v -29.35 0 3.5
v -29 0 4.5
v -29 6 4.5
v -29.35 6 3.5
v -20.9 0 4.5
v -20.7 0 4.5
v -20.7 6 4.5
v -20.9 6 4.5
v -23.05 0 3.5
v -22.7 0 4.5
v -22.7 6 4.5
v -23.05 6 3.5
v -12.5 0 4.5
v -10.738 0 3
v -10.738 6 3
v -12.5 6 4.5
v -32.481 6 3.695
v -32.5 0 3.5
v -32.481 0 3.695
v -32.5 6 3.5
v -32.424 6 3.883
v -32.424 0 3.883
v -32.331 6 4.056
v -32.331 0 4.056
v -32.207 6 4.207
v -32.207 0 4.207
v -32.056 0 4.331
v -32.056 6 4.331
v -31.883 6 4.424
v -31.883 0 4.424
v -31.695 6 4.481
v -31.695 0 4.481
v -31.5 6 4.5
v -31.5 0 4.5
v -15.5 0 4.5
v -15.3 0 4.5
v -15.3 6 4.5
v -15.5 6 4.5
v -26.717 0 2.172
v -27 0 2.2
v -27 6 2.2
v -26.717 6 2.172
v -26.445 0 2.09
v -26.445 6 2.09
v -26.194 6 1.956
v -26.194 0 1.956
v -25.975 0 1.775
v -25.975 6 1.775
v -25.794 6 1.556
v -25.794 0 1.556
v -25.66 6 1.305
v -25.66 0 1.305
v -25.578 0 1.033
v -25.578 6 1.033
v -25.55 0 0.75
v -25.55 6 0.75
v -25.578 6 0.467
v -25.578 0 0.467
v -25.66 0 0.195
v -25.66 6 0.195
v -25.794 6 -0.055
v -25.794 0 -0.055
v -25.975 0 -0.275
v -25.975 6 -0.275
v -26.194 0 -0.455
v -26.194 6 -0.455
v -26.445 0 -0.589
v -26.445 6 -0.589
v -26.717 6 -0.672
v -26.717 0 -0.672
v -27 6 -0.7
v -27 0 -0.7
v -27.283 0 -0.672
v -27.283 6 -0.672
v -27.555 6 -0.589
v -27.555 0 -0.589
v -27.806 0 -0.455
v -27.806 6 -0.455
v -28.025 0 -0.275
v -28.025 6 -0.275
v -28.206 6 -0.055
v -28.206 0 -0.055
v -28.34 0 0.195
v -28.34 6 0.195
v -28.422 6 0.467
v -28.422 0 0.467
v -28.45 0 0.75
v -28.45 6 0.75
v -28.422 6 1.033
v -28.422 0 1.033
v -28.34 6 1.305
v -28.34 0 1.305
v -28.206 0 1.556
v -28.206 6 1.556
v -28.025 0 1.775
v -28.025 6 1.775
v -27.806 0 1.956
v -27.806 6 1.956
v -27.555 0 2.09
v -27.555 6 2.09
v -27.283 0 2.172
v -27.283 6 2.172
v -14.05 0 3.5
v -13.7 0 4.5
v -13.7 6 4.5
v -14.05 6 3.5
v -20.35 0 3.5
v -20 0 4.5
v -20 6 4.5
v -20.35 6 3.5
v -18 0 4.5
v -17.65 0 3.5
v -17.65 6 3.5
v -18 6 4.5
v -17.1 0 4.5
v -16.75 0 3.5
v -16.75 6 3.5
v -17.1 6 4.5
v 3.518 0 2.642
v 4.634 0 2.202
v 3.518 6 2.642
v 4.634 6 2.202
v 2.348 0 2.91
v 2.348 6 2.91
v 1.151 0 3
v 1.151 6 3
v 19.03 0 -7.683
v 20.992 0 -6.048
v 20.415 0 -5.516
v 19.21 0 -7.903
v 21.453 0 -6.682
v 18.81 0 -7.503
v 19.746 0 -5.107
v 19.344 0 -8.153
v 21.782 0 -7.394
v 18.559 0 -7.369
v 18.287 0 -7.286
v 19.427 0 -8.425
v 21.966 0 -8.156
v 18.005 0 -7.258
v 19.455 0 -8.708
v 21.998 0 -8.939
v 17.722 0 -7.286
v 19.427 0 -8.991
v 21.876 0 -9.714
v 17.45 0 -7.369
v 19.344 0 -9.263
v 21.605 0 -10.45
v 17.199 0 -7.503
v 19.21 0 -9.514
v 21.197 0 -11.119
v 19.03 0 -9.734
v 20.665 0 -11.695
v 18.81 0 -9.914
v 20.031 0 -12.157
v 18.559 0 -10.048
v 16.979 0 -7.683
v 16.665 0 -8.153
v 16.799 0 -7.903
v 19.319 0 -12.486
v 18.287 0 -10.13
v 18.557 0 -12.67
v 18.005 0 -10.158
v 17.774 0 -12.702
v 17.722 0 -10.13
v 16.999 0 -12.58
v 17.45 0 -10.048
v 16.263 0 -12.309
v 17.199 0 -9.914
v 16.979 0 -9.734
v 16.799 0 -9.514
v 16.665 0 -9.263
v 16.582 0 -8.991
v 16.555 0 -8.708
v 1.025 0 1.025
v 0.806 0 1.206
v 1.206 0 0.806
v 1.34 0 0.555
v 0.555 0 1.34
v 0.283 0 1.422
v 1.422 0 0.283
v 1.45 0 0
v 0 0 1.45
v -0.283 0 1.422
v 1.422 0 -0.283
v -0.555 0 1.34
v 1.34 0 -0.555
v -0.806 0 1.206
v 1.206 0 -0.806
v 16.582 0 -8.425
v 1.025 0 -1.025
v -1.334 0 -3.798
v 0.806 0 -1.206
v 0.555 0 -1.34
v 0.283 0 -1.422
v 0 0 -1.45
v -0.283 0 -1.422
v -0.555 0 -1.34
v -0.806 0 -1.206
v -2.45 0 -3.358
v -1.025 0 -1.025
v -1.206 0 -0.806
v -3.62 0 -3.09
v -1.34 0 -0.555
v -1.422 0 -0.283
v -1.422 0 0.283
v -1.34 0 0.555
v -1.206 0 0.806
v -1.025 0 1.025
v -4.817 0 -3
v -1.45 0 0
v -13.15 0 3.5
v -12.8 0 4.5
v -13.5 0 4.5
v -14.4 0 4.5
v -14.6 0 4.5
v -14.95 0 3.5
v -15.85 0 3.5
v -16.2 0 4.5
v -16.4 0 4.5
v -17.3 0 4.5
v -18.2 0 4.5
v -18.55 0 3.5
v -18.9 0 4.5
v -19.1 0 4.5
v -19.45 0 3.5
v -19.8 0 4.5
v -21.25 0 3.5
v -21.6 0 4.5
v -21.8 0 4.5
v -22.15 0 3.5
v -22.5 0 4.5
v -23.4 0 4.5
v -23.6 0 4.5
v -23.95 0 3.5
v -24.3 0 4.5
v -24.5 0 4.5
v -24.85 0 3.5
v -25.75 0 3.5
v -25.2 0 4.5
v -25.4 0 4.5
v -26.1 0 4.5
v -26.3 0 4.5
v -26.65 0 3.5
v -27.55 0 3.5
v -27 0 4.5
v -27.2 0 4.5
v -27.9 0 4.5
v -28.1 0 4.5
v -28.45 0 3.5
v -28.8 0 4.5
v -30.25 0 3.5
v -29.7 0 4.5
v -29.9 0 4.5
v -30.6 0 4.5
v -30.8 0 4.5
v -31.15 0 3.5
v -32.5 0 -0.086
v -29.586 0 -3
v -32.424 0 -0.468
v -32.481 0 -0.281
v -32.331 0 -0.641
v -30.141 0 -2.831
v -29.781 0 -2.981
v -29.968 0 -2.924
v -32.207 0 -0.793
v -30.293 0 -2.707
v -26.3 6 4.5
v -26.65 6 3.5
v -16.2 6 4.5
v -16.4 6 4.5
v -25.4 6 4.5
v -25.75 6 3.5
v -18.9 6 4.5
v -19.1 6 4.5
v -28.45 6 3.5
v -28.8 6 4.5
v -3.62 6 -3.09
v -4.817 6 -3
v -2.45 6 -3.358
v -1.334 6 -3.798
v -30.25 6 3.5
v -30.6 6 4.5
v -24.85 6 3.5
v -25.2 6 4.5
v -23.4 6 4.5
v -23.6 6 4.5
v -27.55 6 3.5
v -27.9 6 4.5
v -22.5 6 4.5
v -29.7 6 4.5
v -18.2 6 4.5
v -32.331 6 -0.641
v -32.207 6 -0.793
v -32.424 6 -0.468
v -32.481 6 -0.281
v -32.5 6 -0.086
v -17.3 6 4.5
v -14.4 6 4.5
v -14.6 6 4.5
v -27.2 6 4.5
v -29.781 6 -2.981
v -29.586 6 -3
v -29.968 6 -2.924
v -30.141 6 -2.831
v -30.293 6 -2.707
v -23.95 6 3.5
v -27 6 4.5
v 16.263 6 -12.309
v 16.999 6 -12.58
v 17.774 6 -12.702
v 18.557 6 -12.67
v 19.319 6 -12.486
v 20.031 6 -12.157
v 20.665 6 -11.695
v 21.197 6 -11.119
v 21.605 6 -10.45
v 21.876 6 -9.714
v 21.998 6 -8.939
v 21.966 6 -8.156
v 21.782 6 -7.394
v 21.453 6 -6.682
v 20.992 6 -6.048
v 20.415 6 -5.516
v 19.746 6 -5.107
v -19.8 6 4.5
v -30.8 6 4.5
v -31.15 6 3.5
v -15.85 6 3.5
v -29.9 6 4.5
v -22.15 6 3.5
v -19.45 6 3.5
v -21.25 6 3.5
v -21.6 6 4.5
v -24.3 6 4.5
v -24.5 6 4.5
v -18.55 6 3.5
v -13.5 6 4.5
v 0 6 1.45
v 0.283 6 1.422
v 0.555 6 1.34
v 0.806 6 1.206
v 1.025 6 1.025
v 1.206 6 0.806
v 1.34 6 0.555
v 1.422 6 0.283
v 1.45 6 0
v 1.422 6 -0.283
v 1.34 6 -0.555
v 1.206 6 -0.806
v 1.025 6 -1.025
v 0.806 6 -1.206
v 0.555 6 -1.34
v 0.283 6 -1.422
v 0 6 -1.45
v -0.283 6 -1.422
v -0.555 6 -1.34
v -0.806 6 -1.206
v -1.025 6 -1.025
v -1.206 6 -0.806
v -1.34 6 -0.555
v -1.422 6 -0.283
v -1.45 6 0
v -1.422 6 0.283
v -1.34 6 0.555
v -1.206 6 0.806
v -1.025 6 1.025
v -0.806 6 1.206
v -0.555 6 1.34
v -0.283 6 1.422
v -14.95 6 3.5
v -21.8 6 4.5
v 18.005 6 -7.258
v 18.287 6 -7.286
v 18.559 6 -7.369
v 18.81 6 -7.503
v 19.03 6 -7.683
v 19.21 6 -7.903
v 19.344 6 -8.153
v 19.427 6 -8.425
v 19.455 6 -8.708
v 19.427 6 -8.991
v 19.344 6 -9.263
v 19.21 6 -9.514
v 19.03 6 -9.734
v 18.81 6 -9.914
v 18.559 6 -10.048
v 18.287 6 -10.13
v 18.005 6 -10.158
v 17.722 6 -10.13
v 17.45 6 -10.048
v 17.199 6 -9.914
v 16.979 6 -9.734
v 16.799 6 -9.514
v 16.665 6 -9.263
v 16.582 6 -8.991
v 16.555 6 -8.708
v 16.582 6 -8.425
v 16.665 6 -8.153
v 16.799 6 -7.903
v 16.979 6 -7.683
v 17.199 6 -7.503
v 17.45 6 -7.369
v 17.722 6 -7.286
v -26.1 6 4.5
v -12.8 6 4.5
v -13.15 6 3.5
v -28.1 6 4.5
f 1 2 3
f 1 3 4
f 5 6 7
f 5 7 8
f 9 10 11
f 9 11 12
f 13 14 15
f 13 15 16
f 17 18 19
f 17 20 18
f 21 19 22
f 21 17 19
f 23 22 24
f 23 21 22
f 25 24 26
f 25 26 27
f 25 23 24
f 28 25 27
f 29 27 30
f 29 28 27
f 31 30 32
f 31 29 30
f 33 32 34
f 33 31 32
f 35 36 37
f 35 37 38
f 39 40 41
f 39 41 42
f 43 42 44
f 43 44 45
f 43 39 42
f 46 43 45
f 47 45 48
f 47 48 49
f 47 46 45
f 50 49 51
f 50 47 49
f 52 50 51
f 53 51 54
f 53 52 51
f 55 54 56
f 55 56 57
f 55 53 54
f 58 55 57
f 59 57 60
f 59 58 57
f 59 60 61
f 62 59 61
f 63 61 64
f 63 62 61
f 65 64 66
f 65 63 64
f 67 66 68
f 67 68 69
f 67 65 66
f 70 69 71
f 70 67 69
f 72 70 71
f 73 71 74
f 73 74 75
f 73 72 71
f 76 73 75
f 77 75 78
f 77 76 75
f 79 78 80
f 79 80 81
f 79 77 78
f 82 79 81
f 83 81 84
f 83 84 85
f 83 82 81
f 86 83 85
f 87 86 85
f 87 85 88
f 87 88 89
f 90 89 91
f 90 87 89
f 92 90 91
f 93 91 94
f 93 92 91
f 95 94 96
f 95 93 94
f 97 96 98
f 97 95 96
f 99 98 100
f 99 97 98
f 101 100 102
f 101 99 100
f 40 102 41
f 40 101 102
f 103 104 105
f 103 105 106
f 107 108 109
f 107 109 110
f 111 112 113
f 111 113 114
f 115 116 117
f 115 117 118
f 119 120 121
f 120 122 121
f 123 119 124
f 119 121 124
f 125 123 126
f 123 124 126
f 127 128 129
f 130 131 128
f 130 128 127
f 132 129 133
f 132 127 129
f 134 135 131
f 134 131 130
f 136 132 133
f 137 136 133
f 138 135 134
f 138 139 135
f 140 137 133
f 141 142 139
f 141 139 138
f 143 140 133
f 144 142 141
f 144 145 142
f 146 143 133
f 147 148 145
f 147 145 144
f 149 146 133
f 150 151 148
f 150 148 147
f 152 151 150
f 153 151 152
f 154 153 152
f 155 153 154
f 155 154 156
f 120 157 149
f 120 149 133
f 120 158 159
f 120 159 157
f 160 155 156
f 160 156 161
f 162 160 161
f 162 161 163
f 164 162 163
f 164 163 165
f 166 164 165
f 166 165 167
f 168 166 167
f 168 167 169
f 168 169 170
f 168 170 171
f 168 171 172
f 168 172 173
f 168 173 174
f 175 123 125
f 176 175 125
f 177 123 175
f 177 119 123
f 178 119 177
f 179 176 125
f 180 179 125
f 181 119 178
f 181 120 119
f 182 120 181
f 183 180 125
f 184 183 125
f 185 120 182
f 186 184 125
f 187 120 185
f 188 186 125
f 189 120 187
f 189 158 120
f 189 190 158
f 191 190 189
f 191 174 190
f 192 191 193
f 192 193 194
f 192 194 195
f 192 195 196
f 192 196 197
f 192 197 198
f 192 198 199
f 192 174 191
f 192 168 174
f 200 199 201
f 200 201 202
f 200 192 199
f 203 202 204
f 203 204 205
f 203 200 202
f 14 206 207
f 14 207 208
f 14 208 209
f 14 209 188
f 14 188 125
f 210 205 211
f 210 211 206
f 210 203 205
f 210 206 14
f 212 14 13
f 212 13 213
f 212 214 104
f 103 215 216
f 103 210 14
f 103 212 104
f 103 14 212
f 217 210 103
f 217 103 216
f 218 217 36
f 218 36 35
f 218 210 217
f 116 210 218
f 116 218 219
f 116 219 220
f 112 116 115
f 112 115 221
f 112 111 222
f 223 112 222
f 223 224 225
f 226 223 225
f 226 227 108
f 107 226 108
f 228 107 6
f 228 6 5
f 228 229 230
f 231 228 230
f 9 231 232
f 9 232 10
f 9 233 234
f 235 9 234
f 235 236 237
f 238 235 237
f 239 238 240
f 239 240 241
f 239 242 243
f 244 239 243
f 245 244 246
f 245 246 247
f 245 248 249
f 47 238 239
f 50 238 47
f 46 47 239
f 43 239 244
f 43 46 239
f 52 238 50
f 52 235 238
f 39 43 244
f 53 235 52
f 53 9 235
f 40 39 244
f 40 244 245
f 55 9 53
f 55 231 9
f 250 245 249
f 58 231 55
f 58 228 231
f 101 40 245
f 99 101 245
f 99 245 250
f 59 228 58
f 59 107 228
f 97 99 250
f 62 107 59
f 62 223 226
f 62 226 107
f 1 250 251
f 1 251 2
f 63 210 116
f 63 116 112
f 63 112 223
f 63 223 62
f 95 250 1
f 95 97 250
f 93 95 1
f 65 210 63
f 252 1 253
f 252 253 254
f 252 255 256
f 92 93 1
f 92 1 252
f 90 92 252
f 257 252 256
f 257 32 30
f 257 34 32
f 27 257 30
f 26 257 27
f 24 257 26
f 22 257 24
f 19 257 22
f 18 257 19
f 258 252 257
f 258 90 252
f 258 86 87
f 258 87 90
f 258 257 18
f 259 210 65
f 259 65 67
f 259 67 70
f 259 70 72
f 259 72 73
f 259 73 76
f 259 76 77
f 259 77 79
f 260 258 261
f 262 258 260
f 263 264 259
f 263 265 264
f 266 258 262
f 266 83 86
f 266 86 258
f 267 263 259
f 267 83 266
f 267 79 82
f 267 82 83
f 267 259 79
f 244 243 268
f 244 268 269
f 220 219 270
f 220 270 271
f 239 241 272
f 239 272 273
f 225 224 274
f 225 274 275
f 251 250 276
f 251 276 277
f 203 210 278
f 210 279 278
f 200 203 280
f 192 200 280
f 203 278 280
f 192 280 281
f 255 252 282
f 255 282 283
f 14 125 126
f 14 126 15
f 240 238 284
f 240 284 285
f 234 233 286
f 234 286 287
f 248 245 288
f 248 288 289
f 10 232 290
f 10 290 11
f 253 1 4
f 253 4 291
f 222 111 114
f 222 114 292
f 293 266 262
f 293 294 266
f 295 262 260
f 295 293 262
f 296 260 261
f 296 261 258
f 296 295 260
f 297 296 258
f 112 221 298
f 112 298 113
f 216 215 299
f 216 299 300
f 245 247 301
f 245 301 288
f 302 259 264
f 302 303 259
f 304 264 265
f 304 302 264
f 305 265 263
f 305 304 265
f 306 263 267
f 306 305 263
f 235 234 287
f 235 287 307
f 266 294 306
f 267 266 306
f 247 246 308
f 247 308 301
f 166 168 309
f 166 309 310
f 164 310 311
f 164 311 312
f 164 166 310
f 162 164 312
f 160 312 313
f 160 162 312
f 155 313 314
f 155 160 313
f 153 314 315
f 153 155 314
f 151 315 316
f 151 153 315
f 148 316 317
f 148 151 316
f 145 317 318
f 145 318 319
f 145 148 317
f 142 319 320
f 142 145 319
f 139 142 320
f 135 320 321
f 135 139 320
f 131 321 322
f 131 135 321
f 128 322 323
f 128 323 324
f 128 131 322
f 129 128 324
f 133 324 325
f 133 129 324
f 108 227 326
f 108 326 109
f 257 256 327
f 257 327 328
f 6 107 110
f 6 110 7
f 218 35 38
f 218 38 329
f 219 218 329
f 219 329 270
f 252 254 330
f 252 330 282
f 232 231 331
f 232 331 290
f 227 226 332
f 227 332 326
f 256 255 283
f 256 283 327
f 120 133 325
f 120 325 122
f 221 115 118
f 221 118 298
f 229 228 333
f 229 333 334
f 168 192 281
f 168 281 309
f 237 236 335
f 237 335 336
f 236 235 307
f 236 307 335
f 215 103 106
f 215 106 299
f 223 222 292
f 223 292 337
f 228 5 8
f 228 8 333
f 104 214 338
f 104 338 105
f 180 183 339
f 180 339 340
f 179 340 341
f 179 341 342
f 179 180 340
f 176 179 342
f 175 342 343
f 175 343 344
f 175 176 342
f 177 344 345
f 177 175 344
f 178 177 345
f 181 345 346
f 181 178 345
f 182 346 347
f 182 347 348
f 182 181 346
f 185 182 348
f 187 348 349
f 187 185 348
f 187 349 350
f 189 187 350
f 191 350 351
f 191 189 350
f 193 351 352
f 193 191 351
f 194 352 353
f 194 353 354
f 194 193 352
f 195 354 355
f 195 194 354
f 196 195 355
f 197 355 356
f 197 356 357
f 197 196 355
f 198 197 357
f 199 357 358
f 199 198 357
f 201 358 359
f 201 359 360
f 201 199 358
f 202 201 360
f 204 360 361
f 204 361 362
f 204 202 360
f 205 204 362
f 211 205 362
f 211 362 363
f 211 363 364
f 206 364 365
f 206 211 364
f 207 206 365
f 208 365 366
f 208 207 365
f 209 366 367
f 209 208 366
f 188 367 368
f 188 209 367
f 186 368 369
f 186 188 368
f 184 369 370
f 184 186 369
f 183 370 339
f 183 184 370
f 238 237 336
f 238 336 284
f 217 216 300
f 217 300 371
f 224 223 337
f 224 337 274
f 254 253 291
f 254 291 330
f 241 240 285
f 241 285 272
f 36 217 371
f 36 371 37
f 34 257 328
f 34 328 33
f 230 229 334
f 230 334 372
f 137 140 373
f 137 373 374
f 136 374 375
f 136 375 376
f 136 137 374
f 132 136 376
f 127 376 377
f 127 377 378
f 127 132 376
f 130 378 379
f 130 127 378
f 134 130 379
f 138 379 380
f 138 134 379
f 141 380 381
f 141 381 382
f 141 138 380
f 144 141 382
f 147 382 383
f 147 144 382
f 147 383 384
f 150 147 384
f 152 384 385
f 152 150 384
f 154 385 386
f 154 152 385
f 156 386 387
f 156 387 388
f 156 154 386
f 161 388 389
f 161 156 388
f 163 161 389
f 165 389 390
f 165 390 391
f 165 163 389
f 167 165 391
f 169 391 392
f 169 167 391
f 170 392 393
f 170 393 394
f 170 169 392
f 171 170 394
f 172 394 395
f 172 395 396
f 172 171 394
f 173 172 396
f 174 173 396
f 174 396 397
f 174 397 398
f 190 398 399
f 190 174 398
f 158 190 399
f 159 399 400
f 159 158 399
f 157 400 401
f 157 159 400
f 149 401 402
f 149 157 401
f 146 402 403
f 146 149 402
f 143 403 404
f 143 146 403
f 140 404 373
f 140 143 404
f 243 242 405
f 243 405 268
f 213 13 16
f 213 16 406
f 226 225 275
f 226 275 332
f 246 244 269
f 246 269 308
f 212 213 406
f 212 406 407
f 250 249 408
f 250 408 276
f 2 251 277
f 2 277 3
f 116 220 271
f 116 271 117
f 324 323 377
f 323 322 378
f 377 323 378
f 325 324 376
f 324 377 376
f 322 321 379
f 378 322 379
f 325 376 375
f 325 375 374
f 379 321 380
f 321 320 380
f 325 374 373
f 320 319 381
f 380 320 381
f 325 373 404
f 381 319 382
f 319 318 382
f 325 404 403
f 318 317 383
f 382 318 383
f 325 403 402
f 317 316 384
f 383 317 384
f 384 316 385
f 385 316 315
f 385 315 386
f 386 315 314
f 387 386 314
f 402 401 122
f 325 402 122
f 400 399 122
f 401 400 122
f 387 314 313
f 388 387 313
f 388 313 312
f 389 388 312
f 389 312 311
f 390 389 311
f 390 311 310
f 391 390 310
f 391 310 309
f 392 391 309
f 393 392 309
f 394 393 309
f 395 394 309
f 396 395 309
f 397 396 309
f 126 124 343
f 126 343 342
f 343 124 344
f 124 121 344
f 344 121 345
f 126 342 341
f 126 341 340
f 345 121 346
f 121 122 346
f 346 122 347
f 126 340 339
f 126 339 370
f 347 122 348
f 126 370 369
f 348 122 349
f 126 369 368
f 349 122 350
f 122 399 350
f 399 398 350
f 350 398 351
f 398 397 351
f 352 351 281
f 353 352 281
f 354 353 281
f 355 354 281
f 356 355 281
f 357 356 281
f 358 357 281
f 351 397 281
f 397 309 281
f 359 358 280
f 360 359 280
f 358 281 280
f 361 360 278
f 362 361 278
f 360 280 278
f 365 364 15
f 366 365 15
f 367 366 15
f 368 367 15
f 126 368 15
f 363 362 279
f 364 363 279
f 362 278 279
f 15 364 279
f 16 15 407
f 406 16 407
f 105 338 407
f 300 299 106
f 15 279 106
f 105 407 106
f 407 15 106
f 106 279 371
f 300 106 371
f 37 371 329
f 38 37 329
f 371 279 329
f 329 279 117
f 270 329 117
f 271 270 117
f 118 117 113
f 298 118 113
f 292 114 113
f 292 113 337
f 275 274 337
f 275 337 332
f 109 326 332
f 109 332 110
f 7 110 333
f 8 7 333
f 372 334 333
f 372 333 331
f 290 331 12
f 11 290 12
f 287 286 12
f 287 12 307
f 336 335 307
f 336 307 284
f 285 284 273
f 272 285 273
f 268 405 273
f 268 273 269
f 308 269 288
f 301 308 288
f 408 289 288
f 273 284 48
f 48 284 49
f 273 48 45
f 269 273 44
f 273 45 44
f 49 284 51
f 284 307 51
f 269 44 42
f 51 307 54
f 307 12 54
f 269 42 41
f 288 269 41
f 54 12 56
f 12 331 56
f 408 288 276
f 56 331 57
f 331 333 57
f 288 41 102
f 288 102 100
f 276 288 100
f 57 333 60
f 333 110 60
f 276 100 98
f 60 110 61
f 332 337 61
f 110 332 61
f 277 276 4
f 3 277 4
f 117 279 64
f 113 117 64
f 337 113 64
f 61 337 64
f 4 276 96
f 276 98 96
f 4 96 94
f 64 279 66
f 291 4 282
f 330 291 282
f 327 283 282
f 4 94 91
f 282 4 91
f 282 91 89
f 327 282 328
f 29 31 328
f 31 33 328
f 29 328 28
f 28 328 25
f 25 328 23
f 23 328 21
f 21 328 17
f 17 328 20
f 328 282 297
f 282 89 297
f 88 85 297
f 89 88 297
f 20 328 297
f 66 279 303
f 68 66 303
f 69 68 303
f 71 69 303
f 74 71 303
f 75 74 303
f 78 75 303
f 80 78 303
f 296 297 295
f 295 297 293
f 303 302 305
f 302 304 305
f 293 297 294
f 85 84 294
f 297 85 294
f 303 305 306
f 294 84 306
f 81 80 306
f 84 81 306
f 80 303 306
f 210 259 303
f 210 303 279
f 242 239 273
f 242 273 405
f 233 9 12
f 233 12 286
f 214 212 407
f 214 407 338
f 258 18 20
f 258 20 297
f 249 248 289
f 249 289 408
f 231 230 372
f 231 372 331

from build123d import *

# Parameters (mm, degrees)
CROQUIS_BASE_R          = 1.45
SALIENTE_EXTRUIR1_DEPTH = 6
REDONDEO1_R             = 1
REDONDEO2_R             = 8


with BuildPart() as part:
    # Croquis base → Saliente-Extruir1 (new body)
    with BuildSketch(Plane(origin=(0, 0, 0), x_dir=(1, 0, 0), z_dir=(0, 1, 0))):
        with BuildLine():
            Line((2.984067851, -3), (-10.738, -3))
            Line((-10.738, -3), (-12.5, -4.5))
            Line((-12.5, -4.5), (-12.6, -4.5))
            Line((-12.6, -4.5), (-12.8, -4.5))
            Line((-12.8, -4.5), (-13.15, -3.5))
            Line((-13.15, -3.5), (-13.5, -4.5))
            Line((-13.5, -4.5), (-13.7, -4.5))
            Line((-13.7, -4.5), (-14.05, -3.5))
            Line((-14.05, -3.5), (-14.4, -4.5))
            Line((-14.4, -4.5), (-14.6, -4.5))
            Line((-14.6, -4.5), (-14.95, -3.5))
            Line((-14.95, -3.5), (-15.3, -4.5))
            Line((-15.3, -4.5), (-15.5, -4.5))
            Line((-15.5, -4.5), (-15.85, -3.5))
            Line((-15.85, -3.5), (-16.2, -4.5))
            Line((-16.2, -4.5), (-16.4, -4.5))
            Line((-16.4, -4.5), (-16.75, -3.5))
            Line((-16.75, -3.5), (-17.1, -4.5))
            Line((-17.1, -4.5), (-17.3, -4.5))
            Line((-17.3, -4.5), (-17.65, -3.5))
            Line((-17.65, -3.5), (-18, -4.5))
            Line((-18, -4.5), (-18.2, -4.5))
            Line((-18.2, -4.5), (-18.55, -3.5))
            Line((-18.55, -3.5), (-18.9, -4.5))
            Line((-18.9, -4.5), (-19.1, -4.5))
            Line((-19.1, -4.5), (-19.45, -3.5))
            Line((-19.45, -3.5), (-19.8, -4.5))
            Line((-19.8, -4.5), (-20, -4.5))
            Line((-20, -4.5), (-20.35, -3.5))
            Line((-20.35, -3.5), (-20.7, -4.5))
            Line((-20.7, -4.5), (-20.9, -4.5))
            Line((-20.9, -4.5), (-21.25, -3.5))
            Line((-21.25, -3.5), (-21.6, -4.5))
            Line((-21.6, -4.5), (-21.8, -4.5))
            Line((-21.8, -4.5), (-22.15, -3.5))
            Line((-22.15, -3.5), (-22.5, -4.5))
            Line((-22.5, -4.5), (-22.7, -4.5))
            Line((-22.7, -4.5), (-23.05, -3.5))
            Line((-23.05, -3.5), (-23.4, -4.5))
            Line((-23.4, -4.5), (-23.6, -4.5))
            Line((-23.6, -4.5), (-23.95, -3.5))
            Line((-23.95, -3.5), (-24.3, -4.5))
            Line((-24.3, -4.5), (-24.5, -4.5))
            Line((-24.5, -4.5), (-24.85, -3.5))
            Line((-24.85, -3.5), (-25.2, -4.5))
            Line((-25.2, -4.5), (-25.4, -4.5))
            Line((-25.4, -4.5), (-25.75, -3.5))
            Line((-25.75, -3.5), (-26.1, -4.5))
            Line((-26.1, -4.5), (-26.3, -4.5))
            Line((-26.3, -4.5), (-26.65, -3.5))
            Line((-26.65, -3.5), (-27, -4.5))
            Line((-27, -4.5), (-27.2, -4.5))
            Line((-27.2, -4.5), (-27.55, -3.5))
            Line((-27.55, -3.5), (-27.9, -4.5))
            Line((-27.9, -4.5), (-28.1, -4.5))
            Line((-28.1, -4.5), (-28.45, -3.5))
            Line((-28.45, -3.5), (-28.8, -4.5))
            Line((-28.8, -4.5), (-29, -4.5))
            Line((-29, -4.5), (-29.35, -3.5))
            Line((-29.35, -3.5), (-29.7, -4.5))
            Line((-29.7, -4.5), (-29.9, -4.5))
            Line((-29.9, -4.5), (-30.25, -3.5))
            Line((-30.25, -3.5), (-30.6, -4.5))
            Line((-30.6, -4.5), (-30.8, -4.5))
            Line((-30.8, -4.5), (-31.15, -3.5))
            Line((-31.15, -3.5), (-31.5, -4.5))
            Line((-31.5, -4.5), (-32.5, -4.5))
            Line((-32.5, -4.5), (-32.5, -3))
            Line((-32.5, -3), (-32.5, 0.5))
            Line((-32.5, 0.5), (-30, 3))
            Line((-30, 3), (-2.984067851, 3))
            Line((-2.984067851, 3), (16.262914155, 12.309249498))
            ThreePointArc((16.262914155, 12.309249498), (21.605496986, 10.45), (19.746247488, 5.107417169))
            Line((19.746247488, 5.107417169), (2.984067851, -3))
        make_face()
        with Locations(Location((-27, -0.750184615, 0), (0, 0, 270))):
            Circle(CROQUIS_BASE_R, mode=Mode.SUBTRACT)
        with Locations(Location((0, 0, 0), (0, 0, 270))):
            Circle(CROQUIS_BASE_R, mode=Mode.SUBTRACT)
        with Locations(Location((18.004580821, 8.708333333, 0), (0, 0, 270))):
            Circle(CROQUIS_BASE_R, mode=Mode.SUBTRACT)
    extrude(amount=SALIENTE_EXTRUIR1_DEPTH)

    # Redondeo1
    redondeo1_edges = [part.edges().sort_by_distance(p)[0] for p in [
        (-30, 3, -3),
        (-32.5, 3, -0.5),
        (-32.5, 3, 4.5),
    ]]
    fillet(redondeo1_edges, radius=REDONDEO1_R - 0.0001)  # a hair under: the kernel refuses the full size

    # Redondeo2
    redondeo2_edges = [part.edges().sort_by_distance(p)[0] for p in [
        (2.984067851, 3, 3),
        (-2.984067851, 3, -3),
    ]]
    fillet(redondeo2_edges, radius=REDONDEO2_R)


solid = part.part
